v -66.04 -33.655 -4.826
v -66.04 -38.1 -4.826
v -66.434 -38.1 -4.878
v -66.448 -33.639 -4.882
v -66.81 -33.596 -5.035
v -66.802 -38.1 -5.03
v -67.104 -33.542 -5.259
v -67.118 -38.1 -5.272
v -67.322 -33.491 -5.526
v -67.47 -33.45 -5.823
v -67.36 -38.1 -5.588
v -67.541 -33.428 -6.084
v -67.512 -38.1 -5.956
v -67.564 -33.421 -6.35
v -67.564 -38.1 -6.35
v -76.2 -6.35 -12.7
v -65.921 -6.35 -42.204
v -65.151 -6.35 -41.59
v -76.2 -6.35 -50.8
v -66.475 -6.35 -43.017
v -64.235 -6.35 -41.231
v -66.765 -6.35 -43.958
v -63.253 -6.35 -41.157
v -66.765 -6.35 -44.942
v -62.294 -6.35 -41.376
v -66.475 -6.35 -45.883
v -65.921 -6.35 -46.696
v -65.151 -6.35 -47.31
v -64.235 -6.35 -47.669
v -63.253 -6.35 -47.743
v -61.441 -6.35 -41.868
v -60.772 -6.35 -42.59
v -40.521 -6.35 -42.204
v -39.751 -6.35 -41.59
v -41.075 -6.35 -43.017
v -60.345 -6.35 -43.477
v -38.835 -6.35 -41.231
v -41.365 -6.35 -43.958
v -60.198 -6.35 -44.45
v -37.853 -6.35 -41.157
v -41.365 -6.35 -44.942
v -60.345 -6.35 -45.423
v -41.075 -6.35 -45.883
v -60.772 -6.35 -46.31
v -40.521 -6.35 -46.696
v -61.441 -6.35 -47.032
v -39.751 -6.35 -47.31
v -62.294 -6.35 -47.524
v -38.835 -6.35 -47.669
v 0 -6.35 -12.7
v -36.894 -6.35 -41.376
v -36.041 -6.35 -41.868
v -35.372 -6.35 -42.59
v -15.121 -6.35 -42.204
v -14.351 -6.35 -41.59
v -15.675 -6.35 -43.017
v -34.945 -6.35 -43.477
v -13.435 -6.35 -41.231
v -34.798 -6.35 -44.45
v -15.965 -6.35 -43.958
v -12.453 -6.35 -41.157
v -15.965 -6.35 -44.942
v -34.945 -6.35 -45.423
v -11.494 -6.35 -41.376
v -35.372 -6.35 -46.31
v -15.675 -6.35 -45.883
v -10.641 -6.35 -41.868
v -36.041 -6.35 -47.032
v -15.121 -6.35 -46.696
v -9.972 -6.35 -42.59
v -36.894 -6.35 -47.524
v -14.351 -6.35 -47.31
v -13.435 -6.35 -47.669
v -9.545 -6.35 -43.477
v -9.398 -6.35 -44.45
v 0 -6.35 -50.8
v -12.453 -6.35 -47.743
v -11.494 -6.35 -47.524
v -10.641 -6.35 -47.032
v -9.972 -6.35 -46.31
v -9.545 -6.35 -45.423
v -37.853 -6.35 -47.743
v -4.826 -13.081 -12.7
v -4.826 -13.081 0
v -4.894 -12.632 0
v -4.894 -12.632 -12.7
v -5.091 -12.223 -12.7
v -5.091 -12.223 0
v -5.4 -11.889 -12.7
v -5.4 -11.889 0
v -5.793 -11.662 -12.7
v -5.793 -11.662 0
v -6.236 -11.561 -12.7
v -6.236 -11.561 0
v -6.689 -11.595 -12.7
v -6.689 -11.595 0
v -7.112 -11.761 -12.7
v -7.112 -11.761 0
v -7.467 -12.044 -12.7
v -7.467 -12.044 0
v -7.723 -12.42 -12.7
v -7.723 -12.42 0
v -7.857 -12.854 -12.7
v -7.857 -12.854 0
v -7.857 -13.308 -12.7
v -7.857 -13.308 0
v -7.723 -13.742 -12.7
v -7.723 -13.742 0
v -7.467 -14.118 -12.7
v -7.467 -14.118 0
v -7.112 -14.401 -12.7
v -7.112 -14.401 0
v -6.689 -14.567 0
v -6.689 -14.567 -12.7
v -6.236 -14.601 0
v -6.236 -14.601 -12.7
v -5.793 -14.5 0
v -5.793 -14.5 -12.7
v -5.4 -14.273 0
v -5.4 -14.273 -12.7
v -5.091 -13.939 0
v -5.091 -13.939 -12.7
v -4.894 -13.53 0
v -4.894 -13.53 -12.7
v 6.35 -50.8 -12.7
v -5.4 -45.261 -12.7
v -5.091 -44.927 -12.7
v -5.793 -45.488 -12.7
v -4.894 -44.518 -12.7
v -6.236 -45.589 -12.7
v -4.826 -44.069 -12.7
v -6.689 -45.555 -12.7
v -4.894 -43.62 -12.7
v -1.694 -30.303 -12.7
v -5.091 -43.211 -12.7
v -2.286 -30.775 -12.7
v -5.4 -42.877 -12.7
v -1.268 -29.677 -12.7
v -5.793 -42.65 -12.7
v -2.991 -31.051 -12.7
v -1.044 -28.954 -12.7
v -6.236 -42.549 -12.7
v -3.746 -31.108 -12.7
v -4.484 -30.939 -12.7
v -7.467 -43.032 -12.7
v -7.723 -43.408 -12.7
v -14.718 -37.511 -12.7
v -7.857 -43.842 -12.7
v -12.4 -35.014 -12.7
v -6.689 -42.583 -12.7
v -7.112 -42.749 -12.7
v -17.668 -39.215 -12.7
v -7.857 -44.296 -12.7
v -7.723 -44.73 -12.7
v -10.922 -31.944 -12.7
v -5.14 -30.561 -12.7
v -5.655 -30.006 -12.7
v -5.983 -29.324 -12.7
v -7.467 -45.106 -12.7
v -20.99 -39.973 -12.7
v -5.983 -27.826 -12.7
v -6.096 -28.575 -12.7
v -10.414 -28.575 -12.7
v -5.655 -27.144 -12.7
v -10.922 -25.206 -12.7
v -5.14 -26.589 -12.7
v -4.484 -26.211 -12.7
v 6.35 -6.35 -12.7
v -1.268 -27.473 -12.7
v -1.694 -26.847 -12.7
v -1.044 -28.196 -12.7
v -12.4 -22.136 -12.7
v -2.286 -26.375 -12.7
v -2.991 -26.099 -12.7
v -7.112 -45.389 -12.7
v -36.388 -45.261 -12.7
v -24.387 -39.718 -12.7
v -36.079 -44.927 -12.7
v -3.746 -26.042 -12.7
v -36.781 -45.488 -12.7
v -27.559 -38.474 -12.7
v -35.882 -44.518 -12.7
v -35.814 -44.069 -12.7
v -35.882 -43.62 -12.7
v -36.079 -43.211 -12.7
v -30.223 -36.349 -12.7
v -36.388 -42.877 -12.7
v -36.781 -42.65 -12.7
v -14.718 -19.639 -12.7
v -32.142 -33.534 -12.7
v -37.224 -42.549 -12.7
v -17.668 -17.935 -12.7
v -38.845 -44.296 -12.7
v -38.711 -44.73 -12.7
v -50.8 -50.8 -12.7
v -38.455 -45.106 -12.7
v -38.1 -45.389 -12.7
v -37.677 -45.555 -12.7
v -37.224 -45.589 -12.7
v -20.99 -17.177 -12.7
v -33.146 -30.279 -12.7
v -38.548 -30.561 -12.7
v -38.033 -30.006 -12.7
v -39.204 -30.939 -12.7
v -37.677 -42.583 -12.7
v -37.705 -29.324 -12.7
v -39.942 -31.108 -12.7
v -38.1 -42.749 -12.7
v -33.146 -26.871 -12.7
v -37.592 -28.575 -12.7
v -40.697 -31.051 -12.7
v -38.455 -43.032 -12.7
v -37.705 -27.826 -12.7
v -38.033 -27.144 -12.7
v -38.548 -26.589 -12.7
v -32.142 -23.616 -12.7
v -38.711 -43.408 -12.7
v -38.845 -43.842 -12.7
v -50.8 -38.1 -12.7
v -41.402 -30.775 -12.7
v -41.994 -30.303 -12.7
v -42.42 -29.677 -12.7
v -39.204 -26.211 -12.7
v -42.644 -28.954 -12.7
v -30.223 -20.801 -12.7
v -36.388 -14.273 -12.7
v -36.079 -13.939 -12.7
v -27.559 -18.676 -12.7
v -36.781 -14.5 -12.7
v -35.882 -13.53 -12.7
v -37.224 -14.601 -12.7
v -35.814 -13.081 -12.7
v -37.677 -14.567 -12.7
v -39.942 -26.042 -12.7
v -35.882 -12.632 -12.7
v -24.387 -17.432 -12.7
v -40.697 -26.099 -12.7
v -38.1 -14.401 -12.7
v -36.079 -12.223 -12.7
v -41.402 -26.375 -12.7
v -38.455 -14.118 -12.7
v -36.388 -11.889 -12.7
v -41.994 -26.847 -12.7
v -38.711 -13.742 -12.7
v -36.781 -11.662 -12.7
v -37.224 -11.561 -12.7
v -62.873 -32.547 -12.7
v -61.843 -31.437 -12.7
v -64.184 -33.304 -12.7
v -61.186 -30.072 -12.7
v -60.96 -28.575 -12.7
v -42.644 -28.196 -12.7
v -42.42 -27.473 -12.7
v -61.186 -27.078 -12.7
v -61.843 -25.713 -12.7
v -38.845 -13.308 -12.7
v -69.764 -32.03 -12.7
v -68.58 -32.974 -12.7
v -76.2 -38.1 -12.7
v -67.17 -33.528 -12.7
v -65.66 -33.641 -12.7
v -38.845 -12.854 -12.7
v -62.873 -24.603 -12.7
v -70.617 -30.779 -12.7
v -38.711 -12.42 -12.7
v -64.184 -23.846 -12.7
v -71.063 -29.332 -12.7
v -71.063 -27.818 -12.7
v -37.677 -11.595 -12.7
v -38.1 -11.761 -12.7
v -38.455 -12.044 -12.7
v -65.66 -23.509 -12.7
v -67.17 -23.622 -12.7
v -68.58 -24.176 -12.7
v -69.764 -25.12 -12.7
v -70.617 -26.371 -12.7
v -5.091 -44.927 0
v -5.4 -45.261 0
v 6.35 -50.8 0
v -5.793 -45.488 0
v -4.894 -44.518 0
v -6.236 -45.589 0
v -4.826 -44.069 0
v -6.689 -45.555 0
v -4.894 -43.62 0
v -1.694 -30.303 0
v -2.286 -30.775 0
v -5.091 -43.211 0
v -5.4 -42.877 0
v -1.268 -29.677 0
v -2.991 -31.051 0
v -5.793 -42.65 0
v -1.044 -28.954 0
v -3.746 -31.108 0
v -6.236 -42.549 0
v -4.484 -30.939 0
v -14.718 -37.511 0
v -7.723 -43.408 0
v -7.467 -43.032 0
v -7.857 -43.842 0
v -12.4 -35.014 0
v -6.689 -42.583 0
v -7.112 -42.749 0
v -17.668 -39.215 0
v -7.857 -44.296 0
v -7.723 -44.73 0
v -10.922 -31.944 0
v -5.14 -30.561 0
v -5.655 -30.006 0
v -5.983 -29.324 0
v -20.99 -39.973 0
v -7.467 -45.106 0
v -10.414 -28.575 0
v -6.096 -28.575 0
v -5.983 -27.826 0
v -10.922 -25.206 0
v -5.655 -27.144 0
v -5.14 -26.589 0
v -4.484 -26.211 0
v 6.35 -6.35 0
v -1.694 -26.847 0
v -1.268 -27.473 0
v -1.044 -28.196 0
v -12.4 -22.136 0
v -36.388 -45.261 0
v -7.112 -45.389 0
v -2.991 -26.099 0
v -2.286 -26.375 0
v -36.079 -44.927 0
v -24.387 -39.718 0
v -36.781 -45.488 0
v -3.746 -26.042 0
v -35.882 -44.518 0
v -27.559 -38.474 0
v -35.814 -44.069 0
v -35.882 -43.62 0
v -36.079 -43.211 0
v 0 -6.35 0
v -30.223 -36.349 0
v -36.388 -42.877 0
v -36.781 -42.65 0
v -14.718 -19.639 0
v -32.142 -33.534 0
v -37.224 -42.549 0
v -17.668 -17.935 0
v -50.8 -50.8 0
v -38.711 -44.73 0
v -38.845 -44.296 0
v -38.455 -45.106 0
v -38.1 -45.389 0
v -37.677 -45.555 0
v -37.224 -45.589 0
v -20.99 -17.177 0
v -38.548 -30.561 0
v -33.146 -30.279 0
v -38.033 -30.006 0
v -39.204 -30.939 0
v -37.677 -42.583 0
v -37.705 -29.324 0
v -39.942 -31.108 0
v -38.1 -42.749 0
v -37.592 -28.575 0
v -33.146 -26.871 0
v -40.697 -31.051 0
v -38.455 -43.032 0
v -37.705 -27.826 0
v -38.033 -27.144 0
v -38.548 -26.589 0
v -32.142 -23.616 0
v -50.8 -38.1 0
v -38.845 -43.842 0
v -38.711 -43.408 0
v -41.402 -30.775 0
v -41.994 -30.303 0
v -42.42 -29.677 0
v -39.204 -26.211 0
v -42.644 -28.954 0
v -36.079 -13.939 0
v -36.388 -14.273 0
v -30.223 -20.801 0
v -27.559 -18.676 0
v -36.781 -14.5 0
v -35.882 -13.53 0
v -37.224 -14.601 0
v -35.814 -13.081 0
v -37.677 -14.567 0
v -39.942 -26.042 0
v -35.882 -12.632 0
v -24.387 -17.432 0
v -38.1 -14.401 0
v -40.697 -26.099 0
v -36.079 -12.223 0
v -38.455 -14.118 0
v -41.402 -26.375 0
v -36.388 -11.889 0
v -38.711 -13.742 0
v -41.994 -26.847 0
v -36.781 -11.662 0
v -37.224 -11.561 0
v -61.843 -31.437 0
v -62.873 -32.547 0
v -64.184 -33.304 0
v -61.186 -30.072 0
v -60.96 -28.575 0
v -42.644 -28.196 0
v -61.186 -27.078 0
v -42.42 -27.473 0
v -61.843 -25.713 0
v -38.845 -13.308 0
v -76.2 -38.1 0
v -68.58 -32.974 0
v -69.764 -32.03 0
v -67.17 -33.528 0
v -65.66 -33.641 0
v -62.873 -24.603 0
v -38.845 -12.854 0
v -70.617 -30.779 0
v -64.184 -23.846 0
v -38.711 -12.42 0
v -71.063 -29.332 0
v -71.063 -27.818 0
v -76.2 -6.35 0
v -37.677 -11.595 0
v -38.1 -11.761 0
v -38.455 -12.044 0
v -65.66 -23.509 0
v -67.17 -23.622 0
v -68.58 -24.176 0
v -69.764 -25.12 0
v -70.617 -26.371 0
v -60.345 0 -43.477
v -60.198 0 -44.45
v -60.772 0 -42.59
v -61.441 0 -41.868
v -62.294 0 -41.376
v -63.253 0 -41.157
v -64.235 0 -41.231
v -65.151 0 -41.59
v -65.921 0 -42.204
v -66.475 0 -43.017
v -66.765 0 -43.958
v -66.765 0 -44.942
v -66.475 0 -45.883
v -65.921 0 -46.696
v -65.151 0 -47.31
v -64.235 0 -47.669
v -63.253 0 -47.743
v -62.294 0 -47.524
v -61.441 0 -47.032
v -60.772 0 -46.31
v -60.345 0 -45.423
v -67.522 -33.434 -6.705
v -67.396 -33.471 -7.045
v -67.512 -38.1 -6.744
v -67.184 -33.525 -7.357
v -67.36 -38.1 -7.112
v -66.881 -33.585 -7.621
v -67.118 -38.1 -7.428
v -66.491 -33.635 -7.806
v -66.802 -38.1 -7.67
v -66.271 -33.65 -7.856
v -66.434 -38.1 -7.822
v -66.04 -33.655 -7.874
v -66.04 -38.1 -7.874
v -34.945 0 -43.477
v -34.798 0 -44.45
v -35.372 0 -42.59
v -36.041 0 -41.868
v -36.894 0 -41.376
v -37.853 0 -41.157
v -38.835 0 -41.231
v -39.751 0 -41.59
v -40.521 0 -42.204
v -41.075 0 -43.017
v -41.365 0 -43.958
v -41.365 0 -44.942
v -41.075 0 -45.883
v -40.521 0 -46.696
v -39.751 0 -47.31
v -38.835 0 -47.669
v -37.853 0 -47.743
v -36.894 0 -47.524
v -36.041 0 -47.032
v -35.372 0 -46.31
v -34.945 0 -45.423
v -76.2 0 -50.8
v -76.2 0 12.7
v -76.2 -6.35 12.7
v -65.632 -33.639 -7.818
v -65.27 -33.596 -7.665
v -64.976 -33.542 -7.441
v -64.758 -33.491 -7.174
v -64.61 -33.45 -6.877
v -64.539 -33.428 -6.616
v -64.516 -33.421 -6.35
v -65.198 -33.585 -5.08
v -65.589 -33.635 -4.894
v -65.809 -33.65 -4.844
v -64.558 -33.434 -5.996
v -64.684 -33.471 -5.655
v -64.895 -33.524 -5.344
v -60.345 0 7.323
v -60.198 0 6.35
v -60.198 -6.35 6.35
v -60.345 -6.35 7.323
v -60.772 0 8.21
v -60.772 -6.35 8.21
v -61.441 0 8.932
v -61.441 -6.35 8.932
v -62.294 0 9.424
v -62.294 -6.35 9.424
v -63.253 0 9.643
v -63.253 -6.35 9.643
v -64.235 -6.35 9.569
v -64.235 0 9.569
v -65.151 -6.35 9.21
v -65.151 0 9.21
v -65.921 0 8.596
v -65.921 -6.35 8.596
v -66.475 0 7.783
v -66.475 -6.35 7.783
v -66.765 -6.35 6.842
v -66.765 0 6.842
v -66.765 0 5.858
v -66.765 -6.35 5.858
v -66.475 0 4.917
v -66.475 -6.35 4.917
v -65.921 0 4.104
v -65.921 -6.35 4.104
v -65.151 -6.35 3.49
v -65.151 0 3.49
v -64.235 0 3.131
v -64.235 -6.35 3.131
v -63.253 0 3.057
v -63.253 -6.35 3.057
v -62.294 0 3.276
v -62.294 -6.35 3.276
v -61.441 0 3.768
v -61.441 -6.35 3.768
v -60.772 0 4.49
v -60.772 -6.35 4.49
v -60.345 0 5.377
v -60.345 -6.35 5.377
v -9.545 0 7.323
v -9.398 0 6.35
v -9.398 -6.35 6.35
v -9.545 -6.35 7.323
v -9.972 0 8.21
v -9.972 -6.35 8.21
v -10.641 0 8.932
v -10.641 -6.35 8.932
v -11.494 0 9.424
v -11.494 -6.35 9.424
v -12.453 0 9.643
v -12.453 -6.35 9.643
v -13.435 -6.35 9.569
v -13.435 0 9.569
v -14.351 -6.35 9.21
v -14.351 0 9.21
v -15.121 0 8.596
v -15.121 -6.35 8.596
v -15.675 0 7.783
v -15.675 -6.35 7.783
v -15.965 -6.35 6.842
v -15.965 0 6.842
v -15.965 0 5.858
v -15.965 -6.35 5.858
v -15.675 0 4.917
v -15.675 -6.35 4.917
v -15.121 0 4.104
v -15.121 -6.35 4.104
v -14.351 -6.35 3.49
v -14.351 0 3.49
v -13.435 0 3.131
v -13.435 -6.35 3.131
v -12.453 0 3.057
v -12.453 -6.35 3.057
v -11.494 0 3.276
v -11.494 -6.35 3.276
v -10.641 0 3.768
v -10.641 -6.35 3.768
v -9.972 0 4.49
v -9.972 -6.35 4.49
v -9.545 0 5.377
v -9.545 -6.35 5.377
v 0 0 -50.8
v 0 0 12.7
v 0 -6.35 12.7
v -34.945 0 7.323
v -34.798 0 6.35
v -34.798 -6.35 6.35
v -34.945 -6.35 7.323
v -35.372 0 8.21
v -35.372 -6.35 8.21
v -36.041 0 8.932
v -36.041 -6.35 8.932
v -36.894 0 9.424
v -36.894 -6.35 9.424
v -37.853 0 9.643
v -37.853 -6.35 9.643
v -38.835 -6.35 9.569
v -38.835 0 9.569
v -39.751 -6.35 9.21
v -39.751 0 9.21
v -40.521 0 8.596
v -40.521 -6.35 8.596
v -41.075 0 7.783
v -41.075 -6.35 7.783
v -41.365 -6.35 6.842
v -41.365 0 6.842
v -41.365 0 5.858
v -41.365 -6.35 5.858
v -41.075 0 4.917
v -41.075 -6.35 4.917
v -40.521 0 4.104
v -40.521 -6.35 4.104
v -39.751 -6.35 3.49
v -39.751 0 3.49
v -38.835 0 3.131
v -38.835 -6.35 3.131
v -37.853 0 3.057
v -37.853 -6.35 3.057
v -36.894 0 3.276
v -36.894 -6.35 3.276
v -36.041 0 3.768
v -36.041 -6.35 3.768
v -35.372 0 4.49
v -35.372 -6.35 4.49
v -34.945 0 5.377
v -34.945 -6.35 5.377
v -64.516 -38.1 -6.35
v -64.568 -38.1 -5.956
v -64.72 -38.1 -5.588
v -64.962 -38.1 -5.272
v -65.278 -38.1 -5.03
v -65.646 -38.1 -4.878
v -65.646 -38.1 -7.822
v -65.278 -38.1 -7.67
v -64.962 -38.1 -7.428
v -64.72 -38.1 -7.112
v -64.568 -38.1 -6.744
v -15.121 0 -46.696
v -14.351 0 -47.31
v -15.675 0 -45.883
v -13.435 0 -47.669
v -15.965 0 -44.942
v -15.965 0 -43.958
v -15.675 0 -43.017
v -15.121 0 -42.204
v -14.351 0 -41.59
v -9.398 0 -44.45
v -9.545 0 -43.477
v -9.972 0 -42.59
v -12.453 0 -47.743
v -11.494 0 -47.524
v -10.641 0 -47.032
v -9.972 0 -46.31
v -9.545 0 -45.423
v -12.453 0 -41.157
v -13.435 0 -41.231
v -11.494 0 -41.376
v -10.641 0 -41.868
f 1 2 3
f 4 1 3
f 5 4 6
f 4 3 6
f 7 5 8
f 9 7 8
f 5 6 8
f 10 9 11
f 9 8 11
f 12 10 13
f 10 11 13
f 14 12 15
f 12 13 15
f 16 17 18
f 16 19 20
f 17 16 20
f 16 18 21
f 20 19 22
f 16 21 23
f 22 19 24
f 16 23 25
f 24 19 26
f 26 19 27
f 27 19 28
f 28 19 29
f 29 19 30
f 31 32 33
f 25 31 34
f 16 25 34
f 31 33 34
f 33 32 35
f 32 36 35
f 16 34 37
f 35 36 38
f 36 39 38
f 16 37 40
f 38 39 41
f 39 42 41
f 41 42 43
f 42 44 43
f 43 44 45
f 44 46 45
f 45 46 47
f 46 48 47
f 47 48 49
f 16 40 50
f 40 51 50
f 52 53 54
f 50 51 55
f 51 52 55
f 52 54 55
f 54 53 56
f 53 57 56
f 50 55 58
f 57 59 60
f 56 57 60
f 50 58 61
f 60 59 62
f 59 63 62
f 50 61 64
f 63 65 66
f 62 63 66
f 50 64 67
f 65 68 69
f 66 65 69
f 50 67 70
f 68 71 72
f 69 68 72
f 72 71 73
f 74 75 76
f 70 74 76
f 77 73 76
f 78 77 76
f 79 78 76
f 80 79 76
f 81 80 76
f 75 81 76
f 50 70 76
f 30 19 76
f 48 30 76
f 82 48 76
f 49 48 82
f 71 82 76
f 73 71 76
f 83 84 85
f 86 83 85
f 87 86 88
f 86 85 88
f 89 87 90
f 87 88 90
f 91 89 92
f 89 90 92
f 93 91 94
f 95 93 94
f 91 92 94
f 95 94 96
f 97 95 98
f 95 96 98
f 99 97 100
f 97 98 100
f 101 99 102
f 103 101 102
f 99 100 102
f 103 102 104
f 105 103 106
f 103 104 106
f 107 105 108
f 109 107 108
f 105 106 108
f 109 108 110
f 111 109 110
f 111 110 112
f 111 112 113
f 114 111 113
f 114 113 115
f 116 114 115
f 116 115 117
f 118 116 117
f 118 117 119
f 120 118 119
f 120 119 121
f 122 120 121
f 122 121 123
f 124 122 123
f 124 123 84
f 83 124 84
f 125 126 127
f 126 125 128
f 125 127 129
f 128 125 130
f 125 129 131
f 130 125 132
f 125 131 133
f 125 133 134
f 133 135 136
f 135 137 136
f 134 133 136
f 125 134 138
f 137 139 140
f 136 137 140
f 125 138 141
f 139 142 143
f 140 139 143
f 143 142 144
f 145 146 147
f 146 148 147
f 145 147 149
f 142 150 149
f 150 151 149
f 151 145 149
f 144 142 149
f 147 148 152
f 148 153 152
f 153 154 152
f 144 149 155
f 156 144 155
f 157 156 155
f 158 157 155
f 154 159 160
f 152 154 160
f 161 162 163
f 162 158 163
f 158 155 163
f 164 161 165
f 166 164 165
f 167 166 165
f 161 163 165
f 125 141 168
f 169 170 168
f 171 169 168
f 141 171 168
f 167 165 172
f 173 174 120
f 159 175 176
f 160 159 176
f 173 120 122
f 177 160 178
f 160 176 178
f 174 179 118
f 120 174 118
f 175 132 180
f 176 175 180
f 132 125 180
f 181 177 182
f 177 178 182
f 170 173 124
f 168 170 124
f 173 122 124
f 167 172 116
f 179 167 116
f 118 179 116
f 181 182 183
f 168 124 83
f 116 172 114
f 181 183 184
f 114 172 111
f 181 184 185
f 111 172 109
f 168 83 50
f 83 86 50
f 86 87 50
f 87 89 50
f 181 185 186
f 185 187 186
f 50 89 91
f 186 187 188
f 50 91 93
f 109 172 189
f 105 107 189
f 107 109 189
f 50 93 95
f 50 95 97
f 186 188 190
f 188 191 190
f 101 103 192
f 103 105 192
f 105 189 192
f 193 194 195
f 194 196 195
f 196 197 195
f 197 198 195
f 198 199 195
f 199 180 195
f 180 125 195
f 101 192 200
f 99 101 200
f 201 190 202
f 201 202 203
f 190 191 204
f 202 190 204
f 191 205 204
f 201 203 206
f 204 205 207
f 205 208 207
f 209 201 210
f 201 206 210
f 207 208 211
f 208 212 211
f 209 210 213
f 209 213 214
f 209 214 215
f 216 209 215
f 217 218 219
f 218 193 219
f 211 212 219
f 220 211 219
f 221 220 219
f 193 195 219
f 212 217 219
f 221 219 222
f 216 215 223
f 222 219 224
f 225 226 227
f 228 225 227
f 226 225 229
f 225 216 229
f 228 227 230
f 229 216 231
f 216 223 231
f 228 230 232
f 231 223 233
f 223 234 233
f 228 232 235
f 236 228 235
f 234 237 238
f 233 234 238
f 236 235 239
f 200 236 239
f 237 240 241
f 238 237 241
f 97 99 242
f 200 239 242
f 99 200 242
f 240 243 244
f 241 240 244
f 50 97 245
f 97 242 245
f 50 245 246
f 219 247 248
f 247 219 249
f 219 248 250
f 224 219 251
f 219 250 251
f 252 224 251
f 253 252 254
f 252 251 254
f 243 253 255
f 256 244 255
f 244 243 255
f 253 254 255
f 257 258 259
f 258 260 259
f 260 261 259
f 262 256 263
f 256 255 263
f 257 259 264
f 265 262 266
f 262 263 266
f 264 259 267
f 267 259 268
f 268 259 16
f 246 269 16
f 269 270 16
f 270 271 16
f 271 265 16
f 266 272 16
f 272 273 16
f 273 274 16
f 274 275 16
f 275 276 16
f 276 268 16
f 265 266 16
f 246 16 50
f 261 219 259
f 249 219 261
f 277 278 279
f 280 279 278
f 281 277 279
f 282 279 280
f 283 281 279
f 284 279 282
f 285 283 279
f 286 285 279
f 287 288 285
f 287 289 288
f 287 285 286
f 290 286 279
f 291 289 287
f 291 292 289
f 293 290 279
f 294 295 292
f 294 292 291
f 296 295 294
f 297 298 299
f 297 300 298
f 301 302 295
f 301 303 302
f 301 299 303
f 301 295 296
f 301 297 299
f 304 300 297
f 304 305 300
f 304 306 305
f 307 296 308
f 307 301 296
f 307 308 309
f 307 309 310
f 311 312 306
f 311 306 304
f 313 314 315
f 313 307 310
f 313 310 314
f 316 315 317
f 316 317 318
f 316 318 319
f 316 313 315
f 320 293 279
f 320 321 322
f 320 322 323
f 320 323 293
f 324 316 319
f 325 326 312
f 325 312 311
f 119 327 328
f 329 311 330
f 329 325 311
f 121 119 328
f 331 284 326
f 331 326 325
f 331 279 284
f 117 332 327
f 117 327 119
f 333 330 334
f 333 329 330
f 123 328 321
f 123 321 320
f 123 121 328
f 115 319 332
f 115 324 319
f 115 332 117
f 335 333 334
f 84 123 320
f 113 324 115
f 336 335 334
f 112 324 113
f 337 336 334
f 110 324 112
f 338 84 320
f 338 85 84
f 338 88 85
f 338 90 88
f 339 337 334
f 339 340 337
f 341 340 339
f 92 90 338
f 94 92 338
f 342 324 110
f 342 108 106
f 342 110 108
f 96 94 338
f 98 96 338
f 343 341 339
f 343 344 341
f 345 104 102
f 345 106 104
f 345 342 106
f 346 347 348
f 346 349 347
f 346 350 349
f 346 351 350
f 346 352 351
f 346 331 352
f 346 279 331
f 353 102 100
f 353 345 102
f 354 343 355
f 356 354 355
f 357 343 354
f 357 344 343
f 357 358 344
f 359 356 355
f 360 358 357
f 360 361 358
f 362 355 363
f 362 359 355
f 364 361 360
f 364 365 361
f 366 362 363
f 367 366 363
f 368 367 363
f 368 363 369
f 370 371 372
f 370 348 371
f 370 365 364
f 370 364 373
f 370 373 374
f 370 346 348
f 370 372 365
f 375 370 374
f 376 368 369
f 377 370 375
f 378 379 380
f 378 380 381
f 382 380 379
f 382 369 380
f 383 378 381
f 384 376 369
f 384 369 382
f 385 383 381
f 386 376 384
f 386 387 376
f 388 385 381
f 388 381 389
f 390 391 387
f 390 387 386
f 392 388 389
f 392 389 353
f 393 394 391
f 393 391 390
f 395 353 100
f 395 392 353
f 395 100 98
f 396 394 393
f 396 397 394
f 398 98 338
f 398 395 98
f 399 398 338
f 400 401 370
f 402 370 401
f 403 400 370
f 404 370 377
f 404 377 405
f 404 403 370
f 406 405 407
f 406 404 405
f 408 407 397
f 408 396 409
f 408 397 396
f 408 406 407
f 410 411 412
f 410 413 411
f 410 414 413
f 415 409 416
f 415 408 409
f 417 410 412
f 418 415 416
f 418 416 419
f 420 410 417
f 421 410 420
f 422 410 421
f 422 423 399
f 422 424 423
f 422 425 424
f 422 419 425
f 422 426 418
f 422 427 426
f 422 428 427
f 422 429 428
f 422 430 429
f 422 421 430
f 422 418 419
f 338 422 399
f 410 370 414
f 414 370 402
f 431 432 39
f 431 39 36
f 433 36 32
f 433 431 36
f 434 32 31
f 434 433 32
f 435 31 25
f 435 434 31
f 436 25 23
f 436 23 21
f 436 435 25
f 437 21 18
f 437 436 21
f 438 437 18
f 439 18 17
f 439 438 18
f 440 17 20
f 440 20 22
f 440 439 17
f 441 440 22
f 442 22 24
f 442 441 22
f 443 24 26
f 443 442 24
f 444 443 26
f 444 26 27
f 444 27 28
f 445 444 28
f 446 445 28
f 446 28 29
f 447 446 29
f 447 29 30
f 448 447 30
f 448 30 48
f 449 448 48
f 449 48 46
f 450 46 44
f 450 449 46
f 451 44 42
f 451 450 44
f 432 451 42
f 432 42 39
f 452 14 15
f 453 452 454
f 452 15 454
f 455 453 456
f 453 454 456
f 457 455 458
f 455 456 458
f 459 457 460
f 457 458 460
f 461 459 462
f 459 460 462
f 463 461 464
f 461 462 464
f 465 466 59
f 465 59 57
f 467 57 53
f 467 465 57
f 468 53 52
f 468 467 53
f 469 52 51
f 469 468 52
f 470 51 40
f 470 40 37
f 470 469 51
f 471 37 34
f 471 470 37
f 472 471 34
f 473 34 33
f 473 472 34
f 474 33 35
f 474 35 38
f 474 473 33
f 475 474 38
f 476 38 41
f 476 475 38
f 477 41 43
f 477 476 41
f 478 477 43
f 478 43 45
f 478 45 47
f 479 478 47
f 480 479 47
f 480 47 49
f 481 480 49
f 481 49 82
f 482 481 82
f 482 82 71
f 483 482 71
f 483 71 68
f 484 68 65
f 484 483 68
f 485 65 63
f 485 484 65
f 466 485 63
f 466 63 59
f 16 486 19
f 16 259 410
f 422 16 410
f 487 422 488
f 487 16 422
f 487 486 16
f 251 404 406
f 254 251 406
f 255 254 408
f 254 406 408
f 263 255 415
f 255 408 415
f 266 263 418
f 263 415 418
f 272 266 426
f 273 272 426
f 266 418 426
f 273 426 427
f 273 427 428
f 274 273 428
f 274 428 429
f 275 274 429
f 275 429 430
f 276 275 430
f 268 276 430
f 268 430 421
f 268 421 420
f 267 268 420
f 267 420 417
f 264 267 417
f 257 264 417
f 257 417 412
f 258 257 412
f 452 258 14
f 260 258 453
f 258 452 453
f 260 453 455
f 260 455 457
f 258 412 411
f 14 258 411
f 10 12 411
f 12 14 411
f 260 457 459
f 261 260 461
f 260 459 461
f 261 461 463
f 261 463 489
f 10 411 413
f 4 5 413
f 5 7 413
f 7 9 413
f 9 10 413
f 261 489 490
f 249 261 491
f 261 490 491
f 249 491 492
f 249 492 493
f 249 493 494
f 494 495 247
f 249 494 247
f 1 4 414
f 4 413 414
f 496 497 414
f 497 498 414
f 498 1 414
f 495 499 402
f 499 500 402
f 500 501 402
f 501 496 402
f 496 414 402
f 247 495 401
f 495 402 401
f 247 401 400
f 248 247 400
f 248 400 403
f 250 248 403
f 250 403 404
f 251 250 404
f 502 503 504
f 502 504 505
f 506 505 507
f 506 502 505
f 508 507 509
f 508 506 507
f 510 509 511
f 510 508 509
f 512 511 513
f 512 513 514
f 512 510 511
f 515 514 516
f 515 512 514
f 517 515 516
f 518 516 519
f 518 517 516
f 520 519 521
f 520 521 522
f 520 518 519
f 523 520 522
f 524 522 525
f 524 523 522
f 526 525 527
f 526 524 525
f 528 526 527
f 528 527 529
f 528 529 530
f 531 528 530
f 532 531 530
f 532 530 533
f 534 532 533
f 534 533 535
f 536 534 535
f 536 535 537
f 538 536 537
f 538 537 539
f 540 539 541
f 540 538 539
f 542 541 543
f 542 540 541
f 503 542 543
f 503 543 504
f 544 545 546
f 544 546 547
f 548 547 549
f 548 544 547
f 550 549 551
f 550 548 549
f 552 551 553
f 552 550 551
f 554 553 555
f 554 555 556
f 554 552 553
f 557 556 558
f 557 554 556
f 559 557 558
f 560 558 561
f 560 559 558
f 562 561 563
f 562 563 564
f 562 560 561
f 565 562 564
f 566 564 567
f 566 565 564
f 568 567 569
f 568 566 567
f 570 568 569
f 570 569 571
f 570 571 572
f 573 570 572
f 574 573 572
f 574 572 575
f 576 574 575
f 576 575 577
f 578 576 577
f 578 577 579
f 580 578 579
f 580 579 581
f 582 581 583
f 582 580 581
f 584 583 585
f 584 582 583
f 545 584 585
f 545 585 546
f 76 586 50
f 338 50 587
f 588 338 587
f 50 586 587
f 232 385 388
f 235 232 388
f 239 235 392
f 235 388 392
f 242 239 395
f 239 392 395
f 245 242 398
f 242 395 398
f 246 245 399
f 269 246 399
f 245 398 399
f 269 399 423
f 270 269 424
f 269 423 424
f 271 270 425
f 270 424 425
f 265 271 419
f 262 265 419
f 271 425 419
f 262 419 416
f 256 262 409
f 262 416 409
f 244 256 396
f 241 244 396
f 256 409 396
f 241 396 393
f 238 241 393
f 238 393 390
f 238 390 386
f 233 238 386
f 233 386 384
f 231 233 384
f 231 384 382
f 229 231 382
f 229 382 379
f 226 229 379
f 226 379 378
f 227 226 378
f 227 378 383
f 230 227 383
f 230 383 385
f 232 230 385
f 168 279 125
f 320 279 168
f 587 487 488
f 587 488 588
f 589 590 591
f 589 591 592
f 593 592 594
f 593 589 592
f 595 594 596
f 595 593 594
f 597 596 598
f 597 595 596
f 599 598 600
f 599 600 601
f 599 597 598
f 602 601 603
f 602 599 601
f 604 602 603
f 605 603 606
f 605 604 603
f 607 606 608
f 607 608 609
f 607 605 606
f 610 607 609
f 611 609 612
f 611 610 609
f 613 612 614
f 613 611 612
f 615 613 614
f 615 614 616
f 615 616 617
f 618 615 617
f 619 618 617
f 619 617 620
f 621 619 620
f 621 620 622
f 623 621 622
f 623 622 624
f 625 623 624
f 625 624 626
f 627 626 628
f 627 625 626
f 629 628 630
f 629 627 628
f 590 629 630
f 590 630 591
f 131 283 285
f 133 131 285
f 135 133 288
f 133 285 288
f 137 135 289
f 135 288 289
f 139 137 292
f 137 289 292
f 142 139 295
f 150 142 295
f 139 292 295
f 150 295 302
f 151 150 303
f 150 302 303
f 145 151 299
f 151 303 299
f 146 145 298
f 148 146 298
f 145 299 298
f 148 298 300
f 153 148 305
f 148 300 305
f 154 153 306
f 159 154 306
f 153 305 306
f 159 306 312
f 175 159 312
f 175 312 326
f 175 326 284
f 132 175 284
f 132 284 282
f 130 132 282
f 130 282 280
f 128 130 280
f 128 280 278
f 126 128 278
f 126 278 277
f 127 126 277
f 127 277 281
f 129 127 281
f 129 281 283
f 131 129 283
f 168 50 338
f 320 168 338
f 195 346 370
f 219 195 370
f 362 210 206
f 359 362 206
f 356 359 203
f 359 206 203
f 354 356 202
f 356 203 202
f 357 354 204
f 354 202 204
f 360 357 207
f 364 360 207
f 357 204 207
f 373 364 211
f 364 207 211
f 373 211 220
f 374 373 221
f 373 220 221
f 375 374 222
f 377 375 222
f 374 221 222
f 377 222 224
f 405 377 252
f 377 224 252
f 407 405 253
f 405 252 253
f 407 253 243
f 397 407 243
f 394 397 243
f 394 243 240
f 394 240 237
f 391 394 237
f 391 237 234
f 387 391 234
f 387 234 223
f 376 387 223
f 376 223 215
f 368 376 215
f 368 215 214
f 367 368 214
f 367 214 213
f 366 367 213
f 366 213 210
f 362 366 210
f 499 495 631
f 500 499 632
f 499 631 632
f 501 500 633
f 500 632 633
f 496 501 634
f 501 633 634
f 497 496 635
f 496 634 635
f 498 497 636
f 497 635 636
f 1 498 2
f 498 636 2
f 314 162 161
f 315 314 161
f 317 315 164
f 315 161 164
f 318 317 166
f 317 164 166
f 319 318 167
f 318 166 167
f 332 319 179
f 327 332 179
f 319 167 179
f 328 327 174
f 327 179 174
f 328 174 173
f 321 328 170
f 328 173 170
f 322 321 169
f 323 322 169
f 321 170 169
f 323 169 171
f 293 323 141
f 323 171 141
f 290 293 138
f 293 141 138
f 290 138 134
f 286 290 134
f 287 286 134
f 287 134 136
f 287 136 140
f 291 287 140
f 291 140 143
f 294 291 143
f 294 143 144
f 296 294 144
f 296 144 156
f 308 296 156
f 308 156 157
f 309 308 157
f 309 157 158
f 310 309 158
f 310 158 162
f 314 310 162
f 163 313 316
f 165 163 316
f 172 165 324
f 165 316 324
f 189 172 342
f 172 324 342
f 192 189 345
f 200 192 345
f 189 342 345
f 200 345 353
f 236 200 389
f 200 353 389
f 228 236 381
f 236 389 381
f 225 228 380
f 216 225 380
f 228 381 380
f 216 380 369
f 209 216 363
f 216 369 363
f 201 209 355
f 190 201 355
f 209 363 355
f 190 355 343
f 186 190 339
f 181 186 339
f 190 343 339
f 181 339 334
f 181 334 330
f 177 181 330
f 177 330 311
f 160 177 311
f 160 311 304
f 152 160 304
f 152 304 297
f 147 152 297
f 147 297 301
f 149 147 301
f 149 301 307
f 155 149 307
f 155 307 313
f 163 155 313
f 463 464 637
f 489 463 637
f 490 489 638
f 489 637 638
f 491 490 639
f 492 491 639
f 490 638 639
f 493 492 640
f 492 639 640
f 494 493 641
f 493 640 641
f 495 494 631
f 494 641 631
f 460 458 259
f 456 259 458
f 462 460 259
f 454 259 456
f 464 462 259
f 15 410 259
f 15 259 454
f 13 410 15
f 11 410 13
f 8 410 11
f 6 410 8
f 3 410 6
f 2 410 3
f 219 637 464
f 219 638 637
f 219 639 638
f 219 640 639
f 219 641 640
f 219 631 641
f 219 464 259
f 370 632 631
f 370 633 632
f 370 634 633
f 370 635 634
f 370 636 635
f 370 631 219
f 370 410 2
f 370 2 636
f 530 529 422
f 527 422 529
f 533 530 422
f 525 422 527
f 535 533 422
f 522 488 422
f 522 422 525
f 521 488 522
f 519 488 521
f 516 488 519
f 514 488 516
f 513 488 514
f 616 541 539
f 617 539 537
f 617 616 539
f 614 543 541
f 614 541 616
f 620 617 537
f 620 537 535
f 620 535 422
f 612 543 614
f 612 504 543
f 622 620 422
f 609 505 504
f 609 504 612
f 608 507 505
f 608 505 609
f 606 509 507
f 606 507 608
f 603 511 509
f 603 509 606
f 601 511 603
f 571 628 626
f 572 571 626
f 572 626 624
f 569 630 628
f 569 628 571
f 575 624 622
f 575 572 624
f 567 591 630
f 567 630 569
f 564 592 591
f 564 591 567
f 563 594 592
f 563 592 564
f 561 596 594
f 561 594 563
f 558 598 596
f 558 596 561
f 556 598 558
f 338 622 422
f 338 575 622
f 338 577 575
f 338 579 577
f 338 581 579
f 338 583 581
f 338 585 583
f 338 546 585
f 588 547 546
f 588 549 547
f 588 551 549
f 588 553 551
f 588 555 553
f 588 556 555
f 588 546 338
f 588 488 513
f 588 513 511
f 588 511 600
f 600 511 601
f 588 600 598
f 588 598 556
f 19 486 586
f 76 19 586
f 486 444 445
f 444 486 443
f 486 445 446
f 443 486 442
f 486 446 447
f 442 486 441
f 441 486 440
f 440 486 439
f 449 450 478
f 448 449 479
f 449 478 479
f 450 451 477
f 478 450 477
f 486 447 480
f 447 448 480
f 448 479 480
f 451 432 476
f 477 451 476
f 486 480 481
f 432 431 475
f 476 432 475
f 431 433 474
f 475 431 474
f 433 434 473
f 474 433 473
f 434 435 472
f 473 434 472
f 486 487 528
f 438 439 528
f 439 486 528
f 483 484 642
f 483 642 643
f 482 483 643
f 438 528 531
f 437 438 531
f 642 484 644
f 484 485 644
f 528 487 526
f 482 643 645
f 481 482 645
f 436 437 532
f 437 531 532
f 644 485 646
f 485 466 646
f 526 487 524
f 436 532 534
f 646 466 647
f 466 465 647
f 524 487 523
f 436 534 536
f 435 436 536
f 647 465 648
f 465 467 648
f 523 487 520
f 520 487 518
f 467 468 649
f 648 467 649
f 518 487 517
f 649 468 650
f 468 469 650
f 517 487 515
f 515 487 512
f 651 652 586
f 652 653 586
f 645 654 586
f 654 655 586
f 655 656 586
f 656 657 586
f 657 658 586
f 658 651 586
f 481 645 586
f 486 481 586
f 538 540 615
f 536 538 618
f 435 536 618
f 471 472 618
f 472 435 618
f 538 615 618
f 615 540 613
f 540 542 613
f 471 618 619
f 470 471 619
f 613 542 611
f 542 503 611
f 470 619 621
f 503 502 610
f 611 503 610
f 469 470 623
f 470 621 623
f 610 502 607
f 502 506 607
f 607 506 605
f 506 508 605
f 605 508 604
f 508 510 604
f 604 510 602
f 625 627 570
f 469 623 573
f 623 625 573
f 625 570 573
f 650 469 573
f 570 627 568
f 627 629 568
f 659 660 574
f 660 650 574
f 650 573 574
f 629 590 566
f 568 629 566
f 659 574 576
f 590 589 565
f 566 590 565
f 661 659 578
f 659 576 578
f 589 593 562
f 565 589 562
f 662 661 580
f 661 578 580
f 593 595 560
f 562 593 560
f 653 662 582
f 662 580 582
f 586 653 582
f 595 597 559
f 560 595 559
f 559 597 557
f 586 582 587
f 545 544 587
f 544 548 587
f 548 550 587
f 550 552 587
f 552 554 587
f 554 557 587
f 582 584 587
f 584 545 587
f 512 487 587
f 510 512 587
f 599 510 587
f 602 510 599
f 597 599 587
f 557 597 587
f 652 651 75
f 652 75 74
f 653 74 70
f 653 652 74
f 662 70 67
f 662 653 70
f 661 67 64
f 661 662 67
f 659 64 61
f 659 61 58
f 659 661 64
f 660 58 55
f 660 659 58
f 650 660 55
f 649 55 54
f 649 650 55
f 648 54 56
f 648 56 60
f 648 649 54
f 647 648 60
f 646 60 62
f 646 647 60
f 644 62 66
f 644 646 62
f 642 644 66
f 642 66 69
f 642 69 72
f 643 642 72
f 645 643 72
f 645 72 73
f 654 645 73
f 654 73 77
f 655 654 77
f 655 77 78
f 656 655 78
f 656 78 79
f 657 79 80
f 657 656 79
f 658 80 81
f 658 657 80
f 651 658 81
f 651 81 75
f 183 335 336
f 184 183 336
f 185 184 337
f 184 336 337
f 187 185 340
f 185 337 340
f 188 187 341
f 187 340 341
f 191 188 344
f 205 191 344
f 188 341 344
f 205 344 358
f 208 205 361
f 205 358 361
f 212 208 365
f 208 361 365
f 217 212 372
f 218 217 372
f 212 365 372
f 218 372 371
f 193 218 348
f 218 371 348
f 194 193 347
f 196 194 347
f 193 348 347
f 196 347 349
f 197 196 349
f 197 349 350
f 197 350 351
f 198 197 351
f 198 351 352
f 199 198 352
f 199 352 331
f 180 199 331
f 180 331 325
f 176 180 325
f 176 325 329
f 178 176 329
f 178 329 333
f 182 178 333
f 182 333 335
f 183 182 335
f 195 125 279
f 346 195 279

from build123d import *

# Parameters (mm, degrees)
F0_W      = 76.2
F0_H      = 12.7
F0_R      = 3.302
F1_DEPTH  = 6.35
F0_H_2    = 38.1
F2_DEPTH  = 50.8
F4_R      = 1.524
F4_R_2    = 11.43
F4_R_3    = 5.08
F4_W      = 25.4
F4_H      = 12.7
F5_DEPTH  = 50.8
F6_DEPTH  = 25.4
F8_DEPTH  = 7.62
F9_W      = 44.45
F9_H      = 12.7
F10_DEPTH = 6.35
F12_DEPTH = 25.4


with BuildPart() as f1:
    # F0 (on Front) → F1 (new body)
    with BuildSketch(Plane.XZ):
        with Locations((-38.1, 6.35)):
            Rectangle(F0_W, F0_H)
        with Locations((-63.5, 6.35)):
            Circle(F0_R, mode=Mode.SUBTRACT)
        with Locations((-38.1, 6.35)):
            Circle(F0_R, mode=Mode.SUBTRACT)
        with Locations((-12.7, 6.35)):
            Circle(F0_R, mode=Mode.SUBTRACT)
    extrude(amount=F1_DEPTH)


with BuildPart() as f1b:
    # F0 (on Front) → F1, piece 2 (new body)
    with BuildSketch(Plane.XZ):
        with Locations((-38.1, -44.45)):
            Rectangle(F0_W, F0_H)
        with Locations((-63.5, -44.45)):
            Circle(F0_R, mode=Mode.SUBTRACT)
        with Locations((-38.1, -44.45)):
            Circle(F0_R, mode=Mode.SUBTRACT)
        with Locations((-12.7, -44.45)):
            Circle(F0_R, mode=Mode.SUBTRACT)
    extrude(amount=F1_DEPTH)


with BuildPart() as f2:
    # F0 (on Front) → F2 (new body)
    with BuildSketch(Plane.XZ):
        with Locations((-38.1, -19.05)):
            Rectangle(F0_W, F0_H_2)
    extrude(amount=F2_DEPTH)


with BuildPart() as f1_1:
    add(f1.part)

    # F3: union F1b, F2
    add(f1b.part)
    add(f2.part)

    # F4 (on face) → F5 (cut)
    with BuildSketch(Plane.XY):
        with Locations((-6.35, -44.069)):
            Circle(F4_R)
        with Locations((-6.35, -13.081)):
            Circle(F4_R)
        with Locations((-37.338, -13.081)):
            Circle(F4_R)
        with Locations((-37.338, -44.069)):
            Circle(F4_R)
        with Locations((-21.844, -28.575)):
            Circle(F4_R_2)
        with Locations((-66.04, -28.575)):
            Circle(F4_R_3)
        with Locations((-63.5, -44.45)):
            Rectangle(F4_W, F4_H)
    extrude(amount=-F5_DEPTH, mode=Mode.SUBTRACT)

    # F6 (cut): a face of the model
    f6_faces = [f1_1.faces().sort_by_distance(p)[0] for p in [
        (-36.7979159702, -26.5619005098, -38.1),
    ]]
    extrude(f6_faces, amount=-F6_DEPTH, mode=Mode.SUBTRACT)

    # F7 (on face) → F8 (cut)
    with BuildSketch(Plane.XZ.offset(38.1)):
        with BuildLine():
            ThreePointArc((-66.04, -7.874), (-64.9623692655, -7.4276307345), (-64.516, -6.35))
            ThreePointArc((-64.516, -6.35), (-64.9623692655, -5.2723692655), (-66.04, -4.826))
            ThreePointArc((-66.04, -4.826), (-67.1176307345, -5.2723692655), (-67.564, -6.35))
            ThreePointArc((-67.564, -6.35), (-67.1176307345, -7.4276307345), (-66.04, -7.874))
        make_face()
    extrude(amount=-F8_DEPTH, mode=Mode.SUBTRACT)

    # F9 (on face) → F10 (join)
    with BuildSketch(Plane.YZ):
        with Locations((-28.575, -6.35)):
            Rectangle(F9_W, F9_H)
    extrude(amount=F10_DEPTH)

    # F11 (on face) → F12 (cut)
    with BuildSketch(Plane(origin=(0, 0, -12.7), x_dir=(1, 0, 0), z_dir=(0, 0, -1))):
        with BuildLine():
            ThreePointArc((-1.016, 28.575), (-3.556, 31.115), (-6.096, 28.575))
            ThreePointArc((-6.096, 28.575), (-3.556, 26.035), (-1.016, 28.575))
        make_face()
        with BuildLine():
            ThreePointArc((-42.672, 28.575), (-40.132, 26.035), (-37.592, 28.575))
            ThreePointArc((-37.592, 28.575), (-40.132, 31.115), (-42.672, 28.575))
        make_face()
    extrude(amount=-F12_DEPTH, mode=Mode.SUBTRACT)


solid = f1_1.part
